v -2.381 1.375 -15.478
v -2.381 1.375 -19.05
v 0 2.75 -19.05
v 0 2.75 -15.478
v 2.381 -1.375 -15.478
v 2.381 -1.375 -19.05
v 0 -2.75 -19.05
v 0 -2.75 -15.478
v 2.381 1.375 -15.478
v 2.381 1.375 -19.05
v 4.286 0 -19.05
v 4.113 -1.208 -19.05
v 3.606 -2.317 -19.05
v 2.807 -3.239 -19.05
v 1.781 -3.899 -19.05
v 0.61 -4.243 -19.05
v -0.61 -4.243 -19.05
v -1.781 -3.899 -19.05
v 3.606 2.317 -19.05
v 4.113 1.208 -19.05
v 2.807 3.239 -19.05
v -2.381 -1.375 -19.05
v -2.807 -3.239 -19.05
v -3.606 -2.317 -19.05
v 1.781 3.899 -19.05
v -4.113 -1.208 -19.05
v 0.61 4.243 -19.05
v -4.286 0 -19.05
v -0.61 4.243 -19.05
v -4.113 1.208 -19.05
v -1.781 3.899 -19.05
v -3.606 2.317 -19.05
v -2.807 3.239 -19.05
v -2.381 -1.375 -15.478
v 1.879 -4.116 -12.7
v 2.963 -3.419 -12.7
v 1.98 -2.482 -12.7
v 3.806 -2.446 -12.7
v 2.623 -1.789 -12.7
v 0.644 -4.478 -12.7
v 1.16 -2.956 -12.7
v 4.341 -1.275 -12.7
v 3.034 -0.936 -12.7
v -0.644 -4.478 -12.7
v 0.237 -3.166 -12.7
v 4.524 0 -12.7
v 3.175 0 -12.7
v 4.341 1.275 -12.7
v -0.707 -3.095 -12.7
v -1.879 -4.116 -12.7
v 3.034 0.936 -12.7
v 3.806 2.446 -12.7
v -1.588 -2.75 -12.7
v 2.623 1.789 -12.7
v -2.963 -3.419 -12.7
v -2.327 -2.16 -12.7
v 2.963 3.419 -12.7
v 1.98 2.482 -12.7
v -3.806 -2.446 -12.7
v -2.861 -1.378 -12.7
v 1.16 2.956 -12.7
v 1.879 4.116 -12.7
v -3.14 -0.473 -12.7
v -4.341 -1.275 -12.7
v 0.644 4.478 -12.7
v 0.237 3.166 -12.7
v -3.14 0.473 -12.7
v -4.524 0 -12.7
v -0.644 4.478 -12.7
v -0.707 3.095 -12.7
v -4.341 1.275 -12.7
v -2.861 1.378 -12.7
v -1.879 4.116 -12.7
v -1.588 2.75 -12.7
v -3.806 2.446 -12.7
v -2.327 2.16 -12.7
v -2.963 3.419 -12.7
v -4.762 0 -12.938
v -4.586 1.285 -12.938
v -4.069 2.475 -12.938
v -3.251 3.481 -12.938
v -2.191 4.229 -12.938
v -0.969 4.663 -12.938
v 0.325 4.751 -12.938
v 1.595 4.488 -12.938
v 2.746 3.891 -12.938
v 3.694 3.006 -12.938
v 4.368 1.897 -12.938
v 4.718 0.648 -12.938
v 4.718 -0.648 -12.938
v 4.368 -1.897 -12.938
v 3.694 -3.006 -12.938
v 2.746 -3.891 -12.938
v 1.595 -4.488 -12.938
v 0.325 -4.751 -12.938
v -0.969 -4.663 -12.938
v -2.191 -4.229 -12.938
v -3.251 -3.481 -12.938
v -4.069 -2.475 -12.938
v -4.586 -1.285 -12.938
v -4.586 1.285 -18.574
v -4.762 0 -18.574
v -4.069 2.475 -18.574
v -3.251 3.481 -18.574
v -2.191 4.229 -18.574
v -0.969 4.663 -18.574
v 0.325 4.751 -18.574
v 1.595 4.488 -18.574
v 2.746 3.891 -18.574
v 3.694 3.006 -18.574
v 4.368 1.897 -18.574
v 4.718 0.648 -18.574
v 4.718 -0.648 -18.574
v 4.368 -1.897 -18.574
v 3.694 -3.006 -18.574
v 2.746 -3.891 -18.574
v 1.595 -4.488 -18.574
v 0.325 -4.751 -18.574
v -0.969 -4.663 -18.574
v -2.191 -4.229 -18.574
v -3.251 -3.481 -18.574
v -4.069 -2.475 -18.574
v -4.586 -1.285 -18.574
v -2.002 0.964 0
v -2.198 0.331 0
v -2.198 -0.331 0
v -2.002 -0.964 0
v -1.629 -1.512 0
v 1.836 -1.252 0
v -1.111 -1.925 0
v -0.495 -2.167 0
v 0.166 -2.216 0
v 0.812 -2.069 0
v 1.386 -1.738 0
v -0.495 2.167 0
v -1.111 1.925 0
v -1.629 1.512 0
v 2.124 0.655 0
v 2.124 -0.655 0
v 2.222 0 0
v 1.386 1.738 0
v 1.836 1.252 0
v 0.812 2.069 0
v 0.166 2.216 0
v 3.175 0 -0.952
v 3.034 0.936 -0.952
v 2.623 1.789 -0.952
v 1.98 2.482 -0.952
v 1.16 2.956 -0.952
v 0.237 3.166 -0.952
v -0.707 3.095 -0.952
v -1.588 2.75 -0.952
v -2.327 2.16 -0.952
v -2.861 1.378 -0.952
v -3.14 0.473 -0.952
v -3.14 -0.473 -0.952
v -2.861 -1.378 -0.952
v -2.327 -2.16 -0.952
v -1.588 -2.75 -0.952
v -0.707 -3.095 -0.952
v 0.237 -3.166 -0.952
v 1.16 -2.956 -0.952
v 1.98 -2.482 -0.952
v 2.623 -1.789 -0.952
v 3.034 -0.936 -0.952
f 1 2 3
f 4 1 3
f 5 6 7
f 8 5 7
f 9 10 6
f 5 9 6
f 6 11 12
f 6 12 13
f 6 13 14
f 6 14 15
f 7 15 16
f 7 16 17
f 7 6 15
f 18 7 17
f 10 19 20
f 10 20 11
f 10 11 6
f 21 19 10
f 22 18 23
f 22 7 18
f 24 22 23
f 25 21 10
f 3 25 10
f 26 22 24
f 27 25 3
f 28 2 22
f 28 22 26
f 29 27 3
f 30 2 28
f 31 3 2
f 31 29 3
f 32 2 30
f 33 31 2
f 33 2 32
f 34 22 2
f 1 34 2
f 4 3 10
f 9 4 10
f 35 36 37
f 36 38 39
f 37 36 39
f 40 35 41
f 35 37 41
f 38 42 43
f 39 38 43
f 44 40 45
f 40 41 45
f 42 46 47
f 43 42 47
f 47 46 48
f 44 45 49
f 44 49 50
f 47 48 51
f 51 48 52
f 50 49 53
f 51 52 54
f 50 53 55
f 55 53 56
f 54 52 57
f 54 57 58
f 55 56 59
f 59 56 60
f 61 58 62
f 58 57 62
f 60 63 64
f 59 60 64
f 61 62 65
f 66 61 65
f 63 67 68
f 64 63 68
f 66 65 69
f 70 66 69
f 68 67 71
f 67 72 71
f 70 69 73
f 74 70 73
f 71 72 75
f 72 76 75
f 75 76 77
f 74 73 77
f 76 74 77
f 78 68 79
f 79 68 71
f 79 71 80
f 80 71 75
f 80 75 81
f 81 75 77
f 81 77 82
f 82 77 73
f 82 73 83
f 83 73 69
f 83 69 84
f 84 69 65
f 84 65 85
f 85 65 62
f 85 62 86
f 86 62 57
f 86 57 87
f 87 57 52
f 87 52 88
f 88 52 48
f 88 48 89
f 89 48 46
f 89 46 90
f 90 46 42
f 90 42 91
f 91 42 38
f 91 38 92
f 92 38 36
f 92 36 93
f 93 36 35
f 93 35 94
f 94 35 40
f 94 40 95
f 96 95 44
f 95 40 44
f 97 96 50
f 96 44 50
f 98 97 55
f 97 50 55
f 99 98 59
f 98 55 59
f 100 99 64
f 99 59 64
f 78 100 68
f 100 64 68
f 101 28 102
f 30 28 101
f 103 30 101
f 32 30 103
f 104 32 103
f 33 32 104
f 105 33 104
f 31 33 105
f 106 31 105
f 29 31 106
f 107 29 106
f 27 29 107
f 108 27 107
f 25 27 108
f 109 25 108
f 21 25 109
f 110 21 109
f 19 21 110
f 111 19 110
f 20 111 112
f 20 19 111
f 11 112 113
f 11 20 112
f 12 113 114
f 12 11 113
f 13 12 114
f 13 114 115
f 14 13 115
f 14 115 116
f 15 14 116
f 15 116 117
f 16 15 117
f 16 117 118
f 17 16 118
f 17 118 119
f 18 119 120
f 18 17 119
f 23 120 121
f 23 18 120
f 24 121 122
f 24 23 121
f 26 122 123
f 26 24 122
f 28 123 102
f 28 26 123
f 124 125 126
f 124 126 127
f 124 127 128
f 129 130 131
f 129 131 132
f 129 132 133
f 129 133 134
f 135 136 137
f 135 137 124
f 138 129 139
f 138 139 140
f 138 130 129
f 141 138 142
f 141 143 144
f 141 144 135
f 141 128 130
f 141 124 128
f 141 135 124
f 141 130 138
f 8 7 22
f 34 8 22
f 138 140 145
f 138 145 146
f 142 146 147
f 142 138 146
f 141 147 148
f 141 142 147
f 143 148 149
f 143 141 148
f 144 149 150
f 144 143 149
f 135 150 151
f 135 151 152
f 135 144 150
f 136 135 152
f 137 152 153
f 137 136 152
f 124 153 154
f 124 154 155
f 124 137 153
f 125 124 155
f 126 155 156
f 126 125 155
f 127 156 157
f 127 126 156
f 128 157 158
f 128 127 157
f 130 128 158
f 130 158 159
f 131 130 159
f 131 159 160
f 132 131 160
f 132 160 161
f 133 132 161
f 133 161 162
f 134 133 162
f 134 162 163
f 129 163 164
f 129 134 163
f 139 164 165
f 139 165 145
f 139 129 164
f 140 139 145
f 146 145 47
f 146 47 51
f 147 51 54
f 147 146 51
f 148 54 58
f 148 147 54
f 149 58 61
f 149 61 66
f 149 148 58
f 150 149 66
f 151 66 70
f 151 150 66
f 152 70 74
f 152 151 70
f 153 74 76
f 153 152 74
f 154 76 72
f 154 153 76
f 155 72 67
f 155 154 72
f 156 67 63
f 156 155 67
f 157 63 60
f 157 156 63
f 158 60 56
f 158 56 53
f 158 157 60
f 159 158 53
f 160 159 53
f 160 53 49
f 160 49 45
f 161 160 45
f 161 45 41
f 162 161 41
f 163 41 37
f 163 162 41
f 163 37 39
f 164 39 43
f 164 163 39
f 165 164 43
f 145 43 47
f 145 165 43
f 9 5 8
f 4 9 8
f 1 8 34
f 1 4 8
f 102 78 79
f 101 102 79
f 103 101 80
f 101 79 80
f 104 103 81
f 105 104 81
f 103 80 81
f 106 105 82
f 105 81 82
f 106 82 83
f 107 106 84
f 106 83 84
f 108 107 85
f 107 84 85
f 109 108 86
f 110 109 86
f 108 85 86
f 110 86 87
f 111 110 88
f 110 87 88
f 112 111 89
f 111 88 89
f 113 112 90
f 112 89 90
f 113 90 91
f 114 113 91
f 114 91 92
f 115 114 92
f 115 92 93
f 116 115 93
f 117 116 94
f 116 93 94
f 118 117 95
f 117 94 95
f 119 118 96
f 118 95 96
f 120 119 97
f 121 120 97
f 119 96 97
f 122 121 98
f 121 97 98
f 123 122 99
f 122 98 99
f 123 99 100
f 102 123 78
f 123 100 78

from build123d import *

# Parameters (mm, degrees)
SKETCH1_R          = 3.175
EXTRUDE1_DEPTH     = 12.7
CHAMFER3_SIZE      = 0.9525
SKETCH6_R          = 4.7625
EXTRUDE2_DEPTH     = 6.35
CUT_EXTRUDE1_DEPTH = 3.571875
CHAMFER1_SIZE      = 0.47625
CHAMFER2_SIZE      = 0.238125


with BuildPart() as part:
    # Sketch1 → Extrude1 (new body)
    with BuildSketch(Plane.XY):
        Circle(SKETCH1_R)
    extrude(amount=-EXTRUDE1_DEPTH)

    # Chamfer3
    chamfer3_edges = [part.edges().sort_by_distance(p)[0] for p in [
        (-3.175, 0, 0),
    ]]
    chamfer(chamfer3_edges, length=CHAMFER3_SIZE)

    # Sketch6 → Extrude2 (add)
    with BuildSketch(Plane(origin=(0, 0, -12.7), x_dir=(-1, 0, 0), z_dir=(0, 0, -1))):
        Circle(SKETCH6_R)
    extrude(amount=EXTRUDE2_DEPTH)

    # Sketch7 → Cut-Extrude1 (cut)
    with BuildSketch(Plane(origin=(0, 0, -19.05), x_dir=(-1, 0, 0), z_dir=(0, 0, -1))):
        Polygon((0, 2.749630657), (-2.38125, 1.374815329), (-2.38125, -1.374815329), (0, -2.749630657), (2.38125, -1.374815329), (2.38125, 1.374815329), align=None)
    extrude(amount=-CUT_EXTRUDE1_DEPTH, mode=Mode.SUBTRACT)

    # Chamfer1
    chamfer1_edges = [part.edges().sort_by_distance(p)[0] for p in [
        (4.7625, 0, -19.05),
    ]]
    chamfer(chamfer1_edges, length=CHAMFER1_SIZE)

    # Chamfer2
    chamfer2_edges = [part.edges().sort_by_distance(p)[0] for p in [
        (4.7625, 0, -12.7),
    ]]
    chamfer(chamfer2_edges, length=CHAMFER2_SIZE)


solid = part.part
